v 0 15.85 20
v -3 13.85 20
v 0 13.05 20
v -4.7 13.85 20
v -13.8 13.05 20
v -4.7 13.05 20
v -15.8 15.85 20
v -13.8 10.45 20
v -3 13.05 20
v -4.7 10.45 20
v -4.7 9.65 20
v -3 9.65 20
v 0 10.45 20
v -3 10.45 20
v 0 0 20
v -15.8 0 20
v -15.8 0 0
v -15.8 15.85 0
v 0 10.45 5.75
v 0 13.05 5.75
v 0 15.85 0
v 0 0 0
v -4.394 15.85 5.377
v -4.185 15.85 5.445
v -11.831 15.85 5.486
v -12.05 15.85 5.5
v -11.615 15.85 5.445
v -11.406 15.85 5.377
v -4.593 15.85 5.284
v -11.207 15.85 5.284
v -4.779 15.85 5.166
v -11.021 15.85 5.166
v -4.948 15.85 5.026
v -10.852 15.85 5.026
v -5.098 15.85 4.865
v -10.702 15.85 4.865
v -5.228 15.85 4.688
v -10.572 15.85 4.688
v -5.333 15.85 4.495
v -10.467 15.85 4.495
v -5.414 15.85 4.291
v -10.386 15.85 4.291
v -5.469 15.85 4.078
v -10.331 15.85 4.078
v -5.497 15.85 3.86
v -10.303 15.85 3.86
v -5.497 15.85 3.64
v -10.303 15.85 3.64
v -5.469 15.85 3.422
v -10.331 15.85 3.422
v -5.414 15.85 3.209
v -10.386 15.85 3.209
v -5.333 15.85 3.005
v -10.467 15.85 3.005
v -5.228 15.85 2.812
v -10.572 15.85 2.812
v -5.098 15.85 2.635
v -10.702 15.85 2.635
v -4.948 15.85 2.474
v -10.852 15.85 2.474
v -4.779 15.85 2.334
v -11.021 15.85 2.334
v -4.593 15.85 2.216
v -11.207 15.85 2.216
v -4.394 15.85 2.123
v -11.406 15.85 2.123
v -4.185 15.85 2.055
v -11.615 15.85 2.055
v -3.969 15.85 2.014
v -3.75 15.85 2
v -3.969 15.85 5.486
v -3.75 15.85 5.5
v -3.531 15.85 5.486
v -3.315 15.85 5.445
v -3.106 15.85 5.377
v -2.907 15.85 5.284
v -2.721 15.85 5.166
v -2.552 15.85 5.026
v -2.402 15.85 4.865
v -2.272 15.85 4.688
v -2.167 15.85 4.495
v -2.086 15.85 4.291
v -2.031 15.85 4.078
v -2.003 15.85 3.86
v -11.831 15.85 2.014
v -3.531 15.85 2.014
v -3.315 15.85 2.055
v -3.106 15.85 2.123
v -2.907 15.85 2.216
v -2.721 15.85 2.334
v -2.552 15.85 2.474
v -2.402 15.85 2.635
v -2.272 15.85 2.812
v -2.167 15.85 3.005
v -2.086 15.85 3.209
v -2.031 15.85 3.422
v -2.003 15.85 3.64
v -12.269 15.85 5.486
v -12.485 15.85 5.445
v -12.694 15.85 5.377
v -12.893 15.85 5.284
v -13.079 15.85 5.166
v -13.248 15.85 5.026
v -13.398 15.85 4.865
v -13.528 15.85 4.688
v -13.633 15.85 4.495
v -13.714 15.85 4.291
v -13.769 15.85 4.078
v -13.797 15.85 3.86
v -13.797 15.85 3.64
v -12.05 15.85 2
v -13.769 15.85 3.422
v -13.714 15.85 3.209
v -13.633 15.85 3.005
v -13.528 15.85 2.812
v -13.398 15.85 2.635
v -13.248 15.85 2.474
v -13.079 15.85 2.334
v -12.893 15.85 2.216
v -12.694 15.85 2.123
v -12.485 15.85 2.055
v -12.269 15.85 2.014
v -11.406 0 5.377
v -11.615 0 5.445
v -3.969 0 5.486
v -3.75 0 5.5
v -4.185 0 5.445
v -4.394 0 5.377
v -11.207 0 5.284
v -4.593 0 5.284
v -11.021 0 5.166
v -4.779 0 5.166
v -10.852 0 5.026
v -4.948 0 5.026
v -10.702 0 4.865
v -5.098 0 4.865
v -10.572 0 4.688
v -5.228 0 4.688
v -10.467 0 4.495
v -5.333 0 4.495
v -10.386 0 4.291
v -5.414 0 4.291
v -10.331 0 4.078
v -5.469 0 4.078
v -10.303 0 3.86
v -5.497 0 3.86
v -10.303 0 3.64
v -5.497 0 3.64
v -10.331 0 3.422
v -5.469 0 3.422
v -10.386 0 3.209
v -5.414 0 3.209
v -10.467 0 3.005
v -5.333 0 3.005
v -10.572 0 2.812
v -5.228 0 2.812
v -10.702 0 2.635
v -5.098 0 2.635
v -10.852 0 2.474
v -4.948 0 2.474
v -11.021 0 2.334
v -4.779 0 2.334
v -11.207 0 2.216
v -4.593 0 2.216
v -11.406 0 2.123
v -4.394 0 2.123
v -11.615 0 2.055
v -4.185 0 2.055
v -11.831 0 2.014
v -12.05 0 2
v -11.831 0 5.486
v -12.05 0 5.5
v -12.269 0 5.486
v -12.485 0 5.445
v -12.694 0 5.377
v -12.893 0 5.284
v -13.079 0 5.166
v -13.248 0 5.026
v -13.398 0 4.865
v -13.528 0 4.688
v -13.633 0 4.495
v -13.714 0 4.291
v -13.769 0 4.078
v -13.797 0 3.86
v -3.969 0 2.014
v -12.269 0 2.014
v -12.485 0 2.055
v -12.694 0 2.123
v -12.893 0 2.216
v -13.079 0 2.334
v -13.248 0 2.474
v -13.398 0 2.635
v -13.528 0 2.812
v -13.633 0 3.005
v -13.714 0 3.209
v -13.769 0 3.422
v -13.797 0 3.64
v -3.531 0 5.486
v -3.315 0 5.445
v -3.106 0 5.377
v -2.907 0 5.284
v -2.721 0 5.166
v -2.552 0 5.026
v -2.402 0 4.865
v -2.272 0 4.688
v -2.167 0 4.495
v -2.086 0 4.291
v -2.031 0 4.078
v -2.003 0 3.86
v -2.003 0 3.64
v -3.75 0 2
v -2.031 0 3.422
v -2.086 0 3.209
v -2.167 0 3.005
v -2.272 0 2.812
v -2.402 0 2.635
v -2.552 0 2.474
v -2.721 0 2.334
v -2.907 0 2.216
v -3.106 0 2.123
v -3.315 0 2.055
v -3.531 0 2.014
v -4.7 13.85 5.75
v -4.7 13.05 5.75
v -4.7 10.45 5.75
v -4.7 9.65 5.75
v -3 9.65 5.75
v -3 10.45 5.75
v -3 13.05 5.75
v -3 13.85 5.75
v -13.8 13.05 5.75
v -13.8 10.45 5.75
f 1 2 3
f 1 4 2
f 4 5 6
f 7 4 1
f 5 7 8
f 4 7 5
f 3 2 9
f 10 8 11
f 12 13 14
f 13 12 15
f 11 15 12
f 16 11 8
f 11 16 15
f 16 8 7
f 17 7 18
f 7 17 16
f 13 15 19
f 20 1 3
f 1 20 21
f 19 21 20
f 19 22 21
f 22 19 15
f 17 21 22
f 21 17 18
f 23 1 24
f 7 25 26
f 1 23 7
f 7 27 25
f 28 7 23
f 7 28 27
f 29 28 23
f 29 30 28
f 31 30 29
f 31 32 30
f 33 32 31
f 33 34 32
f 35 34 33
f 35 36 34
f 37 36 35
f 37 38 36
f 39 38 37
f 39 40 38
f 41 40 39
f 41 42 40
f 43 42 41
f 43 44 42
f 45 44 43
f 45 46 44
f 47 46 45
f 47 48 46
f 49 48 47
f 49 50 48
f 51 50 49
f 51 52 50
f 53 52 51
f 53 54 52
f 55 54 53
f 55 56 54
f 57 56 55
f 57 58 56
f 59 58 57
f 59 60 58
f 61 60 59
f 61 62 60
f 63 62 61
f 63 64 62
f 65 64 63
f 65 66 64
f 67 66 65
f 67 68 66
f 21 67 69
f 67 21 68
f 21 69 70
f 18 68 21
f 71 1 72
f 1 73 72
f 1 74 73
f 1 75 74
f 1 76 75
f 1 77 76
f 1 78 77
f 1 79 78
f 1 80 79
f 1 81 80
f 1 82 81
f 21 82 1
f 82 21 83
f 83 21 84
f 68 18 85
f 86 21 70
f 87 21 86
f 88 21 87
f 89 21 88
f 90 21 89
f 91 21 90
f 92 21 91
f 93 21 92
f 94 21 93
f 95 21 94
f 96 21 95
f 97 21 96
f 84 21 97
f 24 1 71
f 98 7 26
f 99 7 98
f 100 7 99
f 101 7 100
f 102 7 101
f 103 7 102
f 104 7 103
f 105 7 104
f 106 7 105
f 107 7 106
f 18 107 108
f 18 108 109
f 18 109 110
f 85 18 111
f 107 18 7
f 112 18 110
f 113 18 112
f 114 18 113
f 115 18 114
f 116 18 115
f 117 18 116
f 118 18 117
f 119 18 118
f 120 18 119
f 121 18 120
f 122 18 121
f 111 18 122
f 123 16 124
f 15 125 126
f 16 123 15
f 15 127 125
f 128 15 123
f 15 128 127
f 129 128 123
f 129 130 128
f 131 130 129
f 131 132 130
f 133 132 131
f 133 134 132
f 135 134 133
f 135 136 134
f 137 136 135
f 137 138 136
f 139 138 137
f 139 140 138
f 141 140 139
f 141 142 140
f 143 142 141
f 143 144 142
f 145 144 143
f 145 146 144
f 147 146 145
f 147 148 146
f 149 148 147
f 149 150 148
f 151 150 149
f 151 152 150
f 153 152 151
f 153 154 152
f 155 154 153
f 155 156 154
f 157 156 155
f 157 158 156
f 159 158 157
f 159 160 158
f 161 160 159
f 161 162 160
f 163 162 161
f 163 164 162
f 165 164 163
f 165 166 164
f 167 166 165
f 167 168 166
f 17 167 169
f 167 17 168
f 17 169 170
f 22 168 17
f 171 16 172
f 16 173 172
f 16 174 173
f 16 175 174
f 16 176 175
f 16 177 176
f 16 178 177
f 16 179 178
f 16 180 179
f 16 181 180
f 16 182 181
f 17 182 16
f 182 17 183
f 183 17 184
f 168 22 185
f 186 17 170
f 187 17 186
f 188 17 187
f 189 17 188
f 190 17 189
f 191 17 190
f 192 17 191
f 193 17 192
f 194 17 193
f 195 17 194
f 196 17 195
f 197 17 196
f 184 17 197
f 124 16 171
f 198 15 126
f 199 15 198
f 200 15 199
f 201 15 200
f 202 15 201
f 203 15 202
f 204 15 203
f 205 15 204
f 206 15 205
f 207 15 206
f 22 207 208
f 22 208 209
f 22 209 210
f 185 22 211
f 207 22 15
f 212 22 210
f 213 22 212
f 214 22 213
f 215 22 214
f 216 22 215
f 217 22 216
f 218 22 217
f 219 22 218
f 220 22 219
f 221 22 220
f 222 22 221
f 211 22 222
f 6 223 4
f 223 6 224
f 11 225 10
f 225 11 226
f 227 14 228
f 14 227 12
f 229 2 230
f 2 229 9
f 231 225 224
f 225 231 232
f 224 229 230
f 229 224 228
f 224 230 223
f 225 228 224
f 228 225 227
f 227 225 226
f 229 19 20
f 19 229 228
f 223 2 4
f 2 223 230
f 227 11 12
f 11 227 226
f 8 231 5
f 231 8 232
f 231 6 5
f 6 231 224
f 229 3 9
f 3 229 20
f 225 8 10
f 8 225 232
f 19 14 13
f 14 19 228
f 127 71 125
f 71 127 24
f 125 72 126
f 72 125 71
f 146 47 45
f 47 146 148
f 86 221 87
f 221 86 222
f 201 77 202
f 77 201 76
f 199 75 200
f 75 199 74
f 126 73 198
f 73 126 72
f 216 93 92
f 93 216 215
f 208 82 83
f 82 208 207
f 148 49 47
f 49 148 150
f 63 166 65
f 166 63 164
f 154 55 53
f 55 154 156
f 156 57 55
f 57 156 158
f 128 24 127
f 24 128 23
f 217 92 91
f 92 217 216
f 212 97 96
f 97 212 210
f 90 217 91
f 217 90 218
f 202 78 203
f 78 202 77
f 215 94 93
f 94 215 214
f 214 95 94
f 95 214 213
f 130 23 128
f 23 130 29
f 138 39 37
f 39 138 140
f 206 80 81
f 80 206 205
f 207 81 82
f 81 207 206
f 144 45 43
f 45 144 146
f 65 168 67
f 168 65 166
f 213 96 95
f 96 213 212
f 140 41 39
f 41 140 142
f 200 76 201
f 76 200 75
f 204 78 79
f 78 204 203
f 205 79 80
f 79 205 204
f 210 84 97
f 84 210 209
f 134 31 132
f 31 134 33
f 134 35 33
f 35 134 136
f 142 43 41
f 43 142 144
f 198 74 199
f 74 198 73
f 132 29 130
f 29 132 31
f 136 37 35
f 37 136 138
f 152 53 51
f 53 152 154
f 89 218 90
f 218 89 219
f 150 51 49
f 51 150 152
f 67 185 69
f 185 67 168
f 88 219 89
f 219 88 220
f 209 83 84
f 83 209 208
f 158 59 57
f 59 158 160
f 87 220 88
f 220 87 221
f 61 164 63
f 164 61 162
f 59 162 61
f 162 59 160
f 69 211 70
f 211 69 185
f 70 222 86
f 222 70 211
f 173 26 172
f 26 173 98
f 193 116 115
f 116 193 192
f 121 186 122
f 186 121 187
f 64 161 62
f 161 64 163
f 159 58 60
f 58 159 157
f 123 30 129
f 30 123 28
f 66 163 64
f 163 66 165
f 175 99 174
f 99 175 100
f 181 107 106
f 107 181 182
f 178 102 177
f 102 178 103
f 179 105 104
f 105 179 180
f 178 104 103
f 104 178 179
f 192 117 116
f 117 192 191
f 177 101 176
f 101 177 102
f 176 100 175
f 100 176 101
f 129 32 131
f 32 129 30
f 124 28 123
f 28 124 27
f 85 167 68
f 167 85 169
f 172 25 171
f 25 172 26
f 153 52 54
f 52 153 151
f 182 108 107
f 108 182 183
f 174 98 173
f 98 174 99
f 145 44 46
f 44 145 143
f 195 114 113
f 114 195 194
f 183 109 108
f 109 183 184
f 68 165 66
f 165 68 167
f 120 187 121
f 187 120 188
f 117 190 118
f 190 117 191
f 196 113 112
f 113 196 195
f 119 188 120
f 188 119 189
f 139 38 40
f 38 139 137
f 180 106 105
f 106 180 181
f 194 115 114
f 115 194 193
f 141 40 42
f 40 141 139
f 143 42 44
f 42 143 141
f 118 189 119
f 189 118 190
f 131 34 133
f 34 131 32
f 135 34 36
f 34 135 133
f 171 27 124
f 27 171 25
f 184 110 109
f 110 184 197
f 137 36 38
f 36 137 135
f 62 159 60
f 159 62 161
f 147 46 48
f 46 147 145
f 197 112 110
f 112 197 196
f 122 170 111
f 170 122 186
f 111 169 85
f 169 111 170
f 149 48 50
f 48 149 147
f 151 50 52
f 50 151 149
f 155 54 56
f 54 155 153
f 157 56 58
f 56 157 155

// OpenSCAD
// Resolution
$fn=50;

// DCDT
dcdt_radius = 9.75;
dcdt_center_offset = 2; // How far off center is the DCDT (wall thickness of mount)

// Groove for captive nut
nut_groove_width = 4.2;
nut_groove_height = 1.7;
nut_groove_off_bottom = 3;

// m3 hardware
m3_clear = 3.5/2; // Standard Fit
nut_driver_clearance = 7.9/2; // Radius of clearance for m3 nut driver
cap_head_clearance = 3.;
cap_head_depth_clearance = 3.5;

// Arm parameters
arm_length = 20;
wall_thickness = 2;
arm_width = dcdt_radius + dcdt_center_offset + nut_groove_width/2 + wall_thickness;
arm_height = nut_driver_clearance*2*2;

// Groove for threaded rod
rod_groove_width = 2.6; 
rod_groove_depth = arm_height - wall_thickness;


// Uncomment for printing orientation
rotate([0,-90,0])

difference(){
    // Main body
    cube([arm_length,arm_width,arm_height]);
    
    // Groove for nut
    translate([m3_clear+wall_thickness*2,-nut_groove_width/2+dcdt_radius+dcdt_center_offset, nut_groove_off_bottom])
    cube([arm_length,nut_groove_width,nut_groove_height]);
    
    // All thread groove
    translate([m3_clear+wall_thickness*2,-rod_groove_width/2+dcdt_radius+dcdt_center_offset,0])
    cube([arm_length, rod_groove_width, rod_groove_depth]);
    
    // Holes for M3 Mounting Screws
    translate([m3_clear+wall_thickness,arm_width,m3_clear+wall_thickness]) 
    rotate([90,0,0])
    cylinder(arm_width,m3_clear,m3_clear);
    
    translate([m3_clear+wall_thickness,arm_width,arm_height-m3_clear-wall_thickness]) 
    rotate([90,0,0])
    cylinder(arm_width,m3_clear,m3_clear);    
}
